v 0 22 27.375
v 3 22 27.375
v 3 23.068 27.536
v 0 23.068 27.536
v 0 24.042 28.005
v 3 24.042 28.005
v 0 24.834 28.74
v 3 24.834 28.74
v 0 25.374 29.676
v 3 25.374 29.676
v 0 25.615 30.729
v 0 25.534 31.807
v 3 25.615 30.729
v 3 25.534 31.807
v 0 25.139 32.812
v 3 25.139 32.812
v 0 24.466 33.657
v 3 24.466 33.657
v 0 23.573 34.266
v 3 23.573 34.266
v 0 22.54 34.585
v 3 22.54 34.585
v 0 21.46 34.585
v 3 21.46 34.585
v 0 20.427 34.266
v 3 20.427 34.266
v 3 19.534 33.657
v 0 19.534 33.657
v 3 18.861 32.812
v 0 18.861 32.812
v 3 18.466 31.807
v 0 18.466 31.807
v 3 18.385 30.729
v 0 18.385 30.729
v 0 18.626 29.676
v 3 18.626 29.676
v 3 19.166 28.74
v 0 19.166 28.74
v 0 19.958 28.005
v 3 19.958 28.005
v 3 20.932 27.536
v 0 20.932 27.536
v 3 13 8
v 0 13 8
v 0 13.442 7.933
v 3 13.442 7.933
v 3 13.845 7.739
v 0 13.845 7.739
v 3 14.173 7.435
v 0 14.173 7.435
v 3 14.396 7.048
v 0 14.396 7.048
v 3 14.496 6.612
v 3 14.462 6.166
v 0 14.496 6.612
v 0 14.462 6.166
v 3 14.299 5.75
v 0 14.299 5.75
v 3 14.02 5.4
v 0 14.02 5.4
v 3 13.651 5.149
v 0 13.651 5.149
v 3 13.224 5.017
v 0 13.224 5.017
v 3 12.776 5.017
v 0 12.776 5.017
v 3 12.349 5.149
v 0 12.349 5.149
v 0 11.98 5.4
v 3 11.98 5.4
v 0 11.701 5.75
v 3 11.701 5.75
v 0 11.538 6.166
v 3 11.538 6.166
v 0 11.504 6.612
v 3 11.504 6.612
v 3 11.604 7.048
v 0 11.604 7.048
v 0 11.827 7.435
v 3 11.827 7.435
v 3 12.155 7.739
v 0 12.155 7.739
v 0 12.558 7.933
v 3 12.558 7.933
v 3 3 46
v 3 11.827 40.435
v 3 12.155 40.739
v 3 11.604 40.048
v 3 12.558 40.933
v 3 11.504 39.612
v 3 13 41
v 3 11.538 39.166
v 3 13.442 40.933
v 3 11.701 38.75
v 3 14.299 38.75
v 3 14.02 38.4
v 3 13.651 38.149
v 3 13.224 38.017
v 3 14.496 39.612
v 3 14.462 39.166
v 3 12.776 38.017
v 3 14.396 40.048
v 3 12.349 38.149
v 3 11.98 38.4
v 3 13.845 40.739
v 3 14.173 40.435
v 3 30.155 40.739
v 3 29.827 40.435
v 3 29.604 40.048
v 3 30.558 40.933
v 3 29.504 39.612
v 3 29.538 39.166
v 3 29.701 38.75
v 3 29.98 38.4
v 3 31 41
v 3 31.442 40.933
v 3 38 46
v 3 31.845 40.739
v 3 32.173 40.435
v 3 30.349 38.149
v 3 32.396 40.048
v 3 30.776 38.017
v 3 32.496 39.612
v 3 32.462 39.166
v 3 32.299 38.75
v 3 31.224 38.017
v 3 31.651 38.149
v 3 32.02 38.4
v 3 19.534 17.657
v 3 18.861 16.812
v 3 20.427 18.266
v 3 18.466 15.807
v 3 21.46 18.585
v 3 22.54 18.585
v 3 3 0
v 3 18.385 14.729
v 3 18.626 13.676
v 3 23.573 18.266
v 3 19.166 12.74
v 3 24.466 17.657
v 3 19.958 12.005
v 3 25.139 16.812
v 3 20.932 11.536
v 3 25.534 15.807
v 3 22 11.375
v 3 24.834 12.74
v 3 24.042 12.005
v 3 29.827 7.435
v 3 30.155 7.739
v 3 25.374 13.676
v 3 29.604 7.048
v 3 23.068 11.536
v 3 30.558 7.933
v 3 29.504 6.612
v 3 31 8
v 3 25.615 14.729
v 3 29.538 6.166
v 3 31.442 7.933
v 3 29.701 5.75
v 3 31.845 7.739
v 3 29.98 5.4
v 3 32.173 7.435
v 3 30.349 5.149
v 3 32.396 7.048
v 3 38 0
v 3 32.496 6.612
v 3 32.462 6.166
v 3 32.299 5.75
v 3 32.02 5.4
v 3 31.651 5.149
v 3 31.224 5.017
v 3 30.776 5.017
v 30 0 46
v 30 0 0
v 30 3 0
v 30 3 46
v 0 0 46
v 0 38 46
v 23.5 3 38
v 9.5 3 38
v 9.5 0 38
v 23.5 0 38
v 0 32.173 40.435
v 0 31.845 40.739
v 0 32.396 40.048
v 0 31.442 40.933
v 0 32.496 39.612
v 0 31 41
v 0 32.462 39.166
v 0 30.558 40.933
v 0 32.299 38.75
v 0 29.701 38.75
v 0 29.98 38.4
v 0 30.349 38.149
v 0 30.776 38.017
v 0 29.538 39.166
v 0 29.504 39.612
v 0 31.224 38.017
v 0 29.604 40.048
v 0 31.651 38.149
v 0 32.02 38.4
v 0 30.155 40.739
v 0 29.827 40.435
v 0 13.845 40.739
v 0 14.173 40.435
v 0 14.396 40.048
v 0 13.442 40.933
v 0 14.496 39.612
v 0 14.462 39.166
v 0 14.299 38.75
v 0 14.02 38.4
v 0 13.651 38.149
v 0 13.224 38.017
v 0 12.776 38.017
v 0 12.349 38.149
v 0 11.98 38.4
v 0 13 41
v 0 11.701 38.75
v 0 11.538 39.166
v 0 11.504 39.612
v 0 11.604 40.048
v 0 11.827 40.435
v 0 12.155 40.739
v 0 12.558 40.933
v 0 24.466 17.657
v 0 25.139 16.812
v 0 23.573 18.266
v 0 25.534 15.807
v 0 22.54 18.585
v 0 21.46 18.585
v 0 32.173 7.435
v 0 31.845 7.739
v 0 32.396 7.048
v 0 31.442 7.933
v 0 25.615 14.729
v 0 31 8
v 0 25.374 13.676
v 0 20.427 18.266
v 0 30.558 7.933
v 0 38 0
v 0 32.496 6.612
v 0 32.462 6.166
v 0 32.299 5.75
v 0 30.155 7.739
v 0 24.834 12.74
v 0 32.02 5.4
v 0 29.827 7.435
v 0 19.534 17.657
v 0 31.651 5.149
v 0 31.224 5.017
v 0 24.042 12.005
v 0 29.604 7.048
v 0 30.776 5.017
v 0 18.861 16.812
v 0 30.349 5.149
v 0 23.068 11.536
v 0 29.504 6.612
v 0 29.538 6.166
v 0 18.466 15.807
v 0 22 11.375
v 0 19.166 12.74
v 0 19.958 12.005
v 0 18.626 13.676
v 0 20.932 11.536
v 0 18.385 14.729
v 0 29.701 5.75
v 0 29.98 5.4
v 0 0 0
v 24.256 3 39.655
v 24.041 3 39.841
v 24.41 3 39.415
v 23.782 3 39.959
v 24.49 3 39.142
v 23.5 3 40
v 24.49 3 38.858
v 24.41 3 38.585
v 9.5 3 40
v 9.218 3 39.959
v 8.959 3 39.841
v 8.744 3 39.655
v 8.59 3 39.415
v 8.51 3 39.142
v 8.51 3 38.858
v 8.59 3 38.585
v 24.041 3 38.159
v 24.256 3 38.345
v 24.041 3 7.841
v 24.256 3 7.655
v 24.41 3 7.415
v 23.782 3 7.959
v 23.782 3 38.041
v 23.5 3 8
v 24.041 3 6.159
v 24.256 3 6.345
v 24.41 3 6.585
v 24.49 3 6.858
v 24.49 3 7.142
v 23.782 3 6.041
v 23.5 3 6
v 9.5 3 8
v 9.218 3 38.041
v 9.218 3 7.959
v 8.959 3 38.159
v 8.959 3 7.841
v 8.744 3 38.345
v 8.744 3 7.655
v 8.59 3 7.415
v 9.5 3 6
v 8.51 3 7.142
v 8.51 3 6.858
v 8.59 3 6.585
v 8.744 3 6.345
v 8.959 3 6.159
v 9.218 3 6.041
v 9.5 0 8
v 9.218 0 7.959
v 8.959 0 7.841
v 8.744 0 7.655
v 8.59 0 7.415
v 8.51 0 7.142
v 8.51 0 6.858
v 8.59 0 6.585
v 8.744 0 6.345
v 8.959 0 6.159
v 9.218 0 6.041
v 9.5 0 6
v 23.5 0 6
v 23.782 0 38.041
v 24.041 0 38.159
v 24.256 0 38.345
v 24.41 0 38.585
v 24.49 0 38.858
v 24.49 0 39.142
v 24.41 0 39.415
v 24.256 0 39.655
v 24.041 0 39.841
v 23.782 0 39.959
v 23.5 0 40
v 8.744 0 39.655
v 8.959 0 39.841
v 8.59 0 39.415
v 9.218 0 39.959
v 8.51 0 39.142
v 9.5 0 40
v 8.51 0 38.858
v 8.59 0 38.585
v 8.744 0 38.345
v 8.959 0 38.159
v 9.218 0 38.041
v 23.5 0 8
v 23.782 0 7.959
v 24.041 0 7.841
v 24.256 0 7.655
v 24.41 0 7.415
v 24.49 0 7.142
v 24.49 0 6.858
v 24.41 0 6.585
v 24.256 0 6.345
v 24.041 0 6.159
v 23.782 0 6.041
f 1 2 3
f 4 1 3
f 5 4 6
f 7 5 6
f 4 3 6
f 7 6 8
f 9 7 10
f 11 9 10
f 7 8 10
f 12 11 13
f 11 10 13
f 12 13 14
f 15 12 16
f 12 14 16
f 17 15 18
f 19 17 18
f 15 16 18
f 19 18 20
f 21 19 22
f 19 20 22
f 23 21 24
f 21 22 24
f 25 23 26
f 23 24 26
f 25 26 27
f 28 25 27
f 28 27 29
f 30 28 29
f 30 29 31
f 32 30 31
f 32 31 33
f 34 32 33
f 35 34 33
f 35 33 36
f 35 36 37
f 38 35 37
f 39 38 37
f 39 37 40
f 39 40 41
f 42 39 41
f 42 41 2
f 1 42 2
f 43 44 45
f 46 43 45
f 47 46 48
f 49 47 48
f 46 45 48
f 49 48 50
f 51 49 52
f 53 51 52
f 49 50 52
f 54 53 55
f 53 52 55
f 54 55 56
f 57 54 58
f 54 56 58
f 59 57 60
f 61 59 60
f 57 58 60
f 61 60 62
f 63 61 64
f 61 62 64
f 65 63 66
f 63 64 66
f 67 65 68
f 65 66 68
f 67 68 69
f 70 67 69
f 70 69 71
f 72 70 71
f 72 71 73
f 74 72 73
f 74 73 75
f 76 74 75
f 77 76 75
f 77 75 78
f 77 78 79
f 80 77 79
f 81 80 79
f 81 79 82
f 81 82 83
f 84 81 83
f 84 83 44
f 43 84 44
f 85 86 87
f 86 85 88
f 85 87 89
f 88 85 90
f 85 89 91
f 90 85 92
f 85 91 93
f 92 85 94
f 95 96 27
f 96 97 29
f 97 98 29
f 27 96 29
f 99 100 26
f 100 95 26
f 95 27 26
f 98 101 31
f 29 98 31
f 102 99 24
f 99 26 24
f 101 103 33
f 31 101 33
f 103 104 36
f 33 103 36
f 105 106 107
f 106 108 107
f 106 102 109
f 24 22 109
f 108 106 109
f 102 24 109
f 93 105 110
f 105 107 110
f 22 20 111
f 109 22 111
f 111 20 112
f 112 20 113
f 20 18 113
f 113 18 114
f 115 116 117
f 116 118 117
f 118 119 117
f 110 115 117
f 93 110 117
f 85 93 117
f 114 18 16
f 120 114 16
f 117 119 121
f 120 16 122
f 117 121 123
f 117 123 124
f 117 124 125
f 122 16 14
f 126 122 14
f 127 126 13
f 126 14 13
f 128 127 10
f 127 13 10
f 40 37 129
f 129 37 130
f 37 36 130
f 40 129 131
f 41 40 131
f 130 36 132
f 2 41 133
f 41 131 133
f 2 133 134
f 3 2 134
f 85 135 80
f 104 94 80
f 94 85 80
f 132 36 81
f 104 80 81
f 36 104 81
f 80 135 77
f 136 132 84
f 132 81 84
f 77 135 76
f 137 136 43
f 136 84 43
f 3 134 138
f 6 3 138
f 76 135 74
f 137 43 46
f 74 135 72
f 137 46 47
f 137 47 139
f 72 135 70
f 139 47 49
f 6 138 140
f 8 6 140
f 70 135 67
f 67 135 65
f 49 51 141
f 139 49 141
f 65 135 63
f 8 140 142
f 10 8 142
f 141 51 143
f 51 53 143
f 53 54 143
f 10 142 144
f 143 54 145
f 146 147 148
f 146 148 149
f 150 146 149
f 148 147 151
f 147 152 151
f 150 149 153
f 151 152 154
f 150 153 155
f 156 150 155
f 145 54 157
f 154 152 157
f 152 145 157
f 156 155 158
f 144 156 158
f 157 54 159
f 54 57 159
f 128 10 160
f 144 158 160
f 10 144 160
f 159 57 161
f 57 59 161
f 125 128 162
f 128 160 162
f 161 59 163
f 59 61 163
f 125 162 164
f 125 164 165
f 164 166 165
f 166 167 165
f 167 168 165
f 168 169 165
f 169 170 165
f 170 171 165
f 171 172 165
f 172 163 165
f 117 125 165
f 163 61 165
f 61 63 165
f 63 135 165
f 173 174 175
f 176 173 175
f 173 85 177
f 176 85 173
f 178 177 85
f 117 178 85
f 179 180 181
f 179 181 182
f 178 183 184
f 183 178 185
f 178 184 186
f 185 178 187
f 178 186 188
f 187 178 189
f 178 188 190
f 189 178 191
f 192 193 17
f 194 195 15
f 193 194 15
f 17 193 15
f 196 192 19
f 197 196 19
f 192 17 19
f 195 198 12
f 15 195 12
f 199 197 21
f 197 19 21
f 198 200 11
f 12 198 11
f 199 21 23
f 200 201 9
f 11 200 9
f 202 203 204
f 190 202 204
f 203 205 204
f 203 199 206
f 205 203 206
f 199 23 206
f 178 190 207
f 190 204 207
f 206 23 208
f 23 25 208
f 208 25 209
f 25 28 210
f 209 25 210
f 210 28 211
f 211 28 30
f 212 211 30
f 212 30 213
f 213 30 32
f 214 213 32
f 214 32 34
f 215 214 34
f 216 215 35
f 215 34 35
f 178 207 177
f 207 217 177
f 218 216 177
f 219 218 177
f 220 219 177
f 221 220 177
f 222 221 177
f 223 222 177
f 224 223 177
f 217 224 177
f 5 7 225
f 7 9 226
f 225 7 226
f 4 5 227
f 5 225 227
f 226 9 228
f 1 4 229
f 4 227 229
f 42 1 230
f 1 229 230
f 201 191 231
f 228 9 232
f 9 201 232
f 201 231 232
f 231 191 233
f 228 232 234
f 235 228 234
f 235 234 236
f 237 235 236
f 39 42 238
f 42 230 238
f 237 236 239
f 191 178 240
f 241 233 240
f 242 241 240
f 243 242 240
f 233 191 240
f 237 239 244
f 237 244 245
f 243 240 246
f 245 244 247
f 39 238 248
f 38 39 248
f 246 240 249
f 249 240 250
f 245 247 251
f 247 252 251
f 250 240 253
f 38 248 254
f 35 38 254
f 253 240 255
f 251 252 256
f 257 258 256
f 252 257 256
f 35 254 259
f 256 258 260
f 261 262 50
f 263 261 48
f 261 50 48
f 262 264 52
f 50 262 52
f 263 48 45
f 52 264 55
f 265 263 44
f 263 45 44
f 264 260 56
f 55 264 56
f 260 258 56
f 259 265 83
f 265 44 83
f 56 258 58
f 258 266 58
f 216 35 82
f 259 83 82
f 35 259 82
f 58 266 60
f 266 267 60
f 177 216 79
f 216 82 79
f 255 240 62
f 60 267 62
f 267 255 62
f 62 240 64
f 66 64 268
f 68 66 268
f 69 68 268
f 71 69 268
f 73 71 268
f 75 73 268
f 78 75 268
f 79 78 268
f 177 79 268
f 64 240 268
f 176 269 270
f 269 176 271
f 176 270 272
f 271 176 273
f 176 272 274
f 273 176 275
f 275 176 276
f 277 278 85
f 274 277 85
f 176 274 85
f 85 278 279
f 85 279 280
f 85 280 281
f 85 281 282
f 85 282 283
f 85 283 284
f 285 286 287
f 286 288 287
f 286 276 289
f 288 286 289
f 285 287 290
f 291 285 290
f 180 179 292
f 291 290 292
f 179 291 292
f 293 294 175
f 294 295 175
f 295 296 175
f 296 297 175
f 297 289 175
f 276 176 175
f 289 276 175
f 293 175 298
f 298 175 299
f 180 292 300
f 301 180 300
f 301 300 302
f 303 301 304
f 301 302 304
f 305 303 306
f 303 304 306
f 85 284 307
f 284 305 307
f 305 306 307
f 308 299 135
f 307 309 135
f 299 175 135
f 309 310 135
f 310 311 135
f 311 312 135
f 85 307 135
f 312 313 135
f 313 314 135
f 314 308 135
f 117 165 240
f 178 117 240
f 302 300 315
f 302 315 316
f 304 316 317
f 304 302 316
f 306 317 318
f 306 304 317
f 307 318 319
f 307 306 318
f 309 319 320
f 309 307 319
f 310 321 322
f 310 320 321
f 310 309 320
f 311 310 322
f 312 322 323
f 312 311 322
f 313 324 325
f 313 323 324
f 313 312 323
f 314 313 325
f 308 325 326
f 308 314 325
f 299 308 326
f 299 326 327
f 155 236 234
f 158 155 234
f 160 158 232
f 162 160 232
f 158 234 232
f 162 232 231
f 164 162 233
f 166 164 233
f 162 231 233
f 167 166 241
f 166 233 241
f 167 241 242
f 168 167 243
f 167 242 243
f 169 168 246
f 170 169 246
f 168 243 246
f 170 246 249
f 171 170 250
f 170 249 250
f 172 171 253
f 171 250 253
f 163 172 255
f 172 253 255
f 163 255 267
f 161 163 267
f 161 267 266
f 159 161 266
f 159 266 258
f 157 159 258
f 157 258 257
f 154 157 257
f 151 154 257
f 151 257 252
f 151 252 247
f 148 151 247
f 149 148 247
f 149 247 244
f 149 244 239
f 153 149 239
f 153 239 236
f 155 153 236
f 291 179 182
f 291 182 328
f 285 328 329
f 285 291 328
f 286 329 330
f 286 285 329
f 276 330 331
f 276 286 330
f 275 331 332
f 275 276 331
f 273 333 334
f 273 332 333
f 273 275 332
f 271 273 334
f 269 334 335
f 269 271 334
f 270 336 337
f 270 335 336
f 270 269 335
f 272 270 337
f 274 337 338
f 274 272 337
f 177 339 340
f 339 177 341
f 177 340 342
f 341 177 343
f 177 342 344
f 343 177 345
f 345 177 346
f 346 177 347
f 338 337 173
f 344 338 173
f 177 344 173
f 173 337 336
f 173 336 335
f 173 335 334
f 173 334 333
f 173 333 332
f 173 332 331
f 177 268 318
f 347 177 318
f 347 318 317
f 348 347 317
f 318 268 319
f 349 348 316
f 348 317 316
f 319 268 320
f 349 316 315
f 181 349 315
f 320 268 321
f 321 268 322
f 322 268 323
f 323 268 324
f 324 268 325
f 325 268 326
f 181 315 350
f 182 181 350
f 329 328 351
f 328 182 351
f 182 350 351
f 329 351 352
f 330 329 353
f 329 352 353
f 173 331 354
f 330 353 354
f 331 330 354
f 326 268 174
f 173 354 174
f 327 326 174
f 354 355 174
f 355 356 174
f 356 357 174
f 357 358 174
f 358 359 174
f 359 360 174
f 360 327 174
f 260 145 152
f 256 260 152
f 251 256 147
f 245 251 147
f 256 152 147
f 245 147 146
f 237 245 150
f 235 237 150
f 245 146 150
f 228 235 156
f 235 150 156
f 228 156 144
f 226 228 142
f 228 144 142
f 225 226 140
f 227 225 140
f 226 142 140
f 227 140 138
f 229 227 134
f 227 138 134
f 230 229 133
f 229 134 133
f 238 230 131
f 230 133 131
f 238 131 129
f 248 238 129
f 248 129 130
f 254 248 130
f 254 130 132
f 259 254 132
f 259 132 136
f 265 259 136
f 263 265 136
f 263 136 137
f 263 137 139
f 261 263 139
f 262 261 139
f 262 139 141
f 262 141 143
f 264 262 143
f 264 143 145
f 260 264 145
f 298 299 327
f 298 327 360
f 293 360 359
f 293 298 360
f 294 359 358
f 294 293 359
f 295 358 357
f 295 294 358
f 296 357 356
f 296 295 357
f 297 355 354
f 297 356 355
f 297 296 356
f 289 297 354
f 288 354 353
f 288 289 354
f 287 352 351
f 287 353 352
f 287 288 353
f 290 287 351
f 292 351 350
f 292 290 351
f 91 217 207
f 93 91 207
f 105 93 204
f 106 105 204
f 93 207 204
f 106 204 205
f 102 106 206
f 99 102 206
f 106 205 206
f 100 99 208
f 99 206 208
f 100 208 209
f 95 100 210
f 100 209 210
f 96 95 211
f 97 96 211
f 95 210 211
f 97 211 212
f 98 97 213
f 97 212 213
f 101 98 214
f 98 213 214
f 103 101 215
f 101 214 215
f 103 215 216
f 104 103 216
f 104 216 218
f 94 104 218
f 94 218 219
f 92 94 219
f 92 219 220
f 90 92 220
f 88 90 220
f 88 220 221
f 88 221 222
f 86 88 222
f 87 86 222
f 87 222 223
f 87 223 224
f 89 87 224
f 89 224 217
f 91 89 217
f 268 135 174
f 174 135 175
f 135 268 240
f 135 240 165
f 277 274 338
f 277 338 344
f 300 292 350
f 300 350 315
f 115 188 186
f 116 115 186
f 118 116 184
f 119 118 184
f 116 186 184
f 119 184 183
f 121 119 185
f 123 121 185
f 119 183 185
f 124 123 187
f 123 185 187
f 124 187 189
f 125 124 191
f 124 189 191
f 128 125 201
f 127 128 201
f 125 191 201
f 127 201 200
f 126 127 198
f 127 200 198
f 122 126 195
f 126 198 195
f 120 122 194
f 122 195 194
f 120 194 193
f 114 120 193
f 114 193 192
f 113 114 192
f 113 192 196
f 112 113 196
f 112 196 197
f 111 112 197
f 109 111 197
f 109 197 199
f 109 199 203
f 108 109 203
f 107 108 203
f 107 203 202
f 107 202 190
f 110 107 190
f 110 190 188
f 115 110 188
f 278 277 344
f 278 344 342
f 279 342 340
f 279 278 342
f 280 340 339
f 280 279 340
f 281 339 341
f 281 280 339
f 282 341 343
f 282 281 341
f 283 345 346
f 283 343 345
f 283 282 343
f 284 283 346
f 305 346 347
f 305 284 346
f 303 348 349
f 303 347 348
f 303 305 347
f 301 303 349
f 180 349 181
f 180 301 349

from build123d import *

# Parameters (mm, degrees)
BOSS_EXTRUDE1_DEPTH = 46
SKETCH2_R           = 3.625
CUT_EXTRUDE1_DEPTH  = 46
SKETCH3_R           = 1.5
CUT_EXTRUDE2_DEPTH  = 10
CUT_EXTRUDE3_DEPTH  = 10


with BuildPart() as part:
    # Sketch1 → Boss-Extrude1 (new body)
    with BuildSketch(Plane.XY):
        Polygon((0, 0), (30, 0), (30, 3), (3, 3), (3, 38), (0, 38), align=None)
    extrude(amount=BOSS_EXTRUDE1_DEPTH)

    # Sketch2 → Cut-Extrude1 (cut)
    with BuildSketch(Plane(origin=(3, 0, 0), x_dir=(0, 0, -1), z_dir=(1, 0, 0))):
        with Locations((-15, 22)):
            Circle(SKETCH2_R)
        with Locations((-31, 22)):
            Circle(SKETCH2_R)
    extrude(amount=-CUT_EXTRUDE1_DEPTH, mode=Mode.SUBTRACT)

    # Sketch3 → Cut-Extrude2 (cut)
    with BuildSketch(Plane.ZY):
        with Locations((39.5, 31)):
            Circle(SKETCH3_R)
        with Locations((6.5, 31)):
            Circle(SKETCH3_R)
        with Locations((39.5, 13)):
            Circle(SKETCH3_R)
        with Locations((6.5, 13)):
            Circle(SKETCH3_R)
    extrude(amount=-CUT_EXTRUDE2_DEPTH, mode=Mode.SUBTRACT)

    # Sketch4 → Cut-Extrude3 (cut)
    with BuildSketch(Plane(origin=(0, 3, 0), x_dir=(1, 0, 0), z_dir=(0, 1, 0))):
        with BuildLine():
            Line((9.5, -38), (23.5, -38))
            ThreePointArc((23.5, -38), (24.5, -39), (23.5, -40))
            Line((23.5, -40), (9.5, -40))
            ThreePointArc((9.5, -40), (8.5, -39), (9.5, -38))
        make_face()
        with BuildLine():
            Line((9.5, -6), (23.5, -6))
            ThreePointArc((23.5, -6), (24.5, -7), (23.5, -8))
            Line((23.5, -8), (9.5, -8))
            ThreePointArc((9.5, -8), (8.5, -7), (9.5, -6))
        make_face()
    extrude(amount=-CUT_EXTRUDE3_DEPTH, mode=Mode.SUBTRACT)


solid = part.part
